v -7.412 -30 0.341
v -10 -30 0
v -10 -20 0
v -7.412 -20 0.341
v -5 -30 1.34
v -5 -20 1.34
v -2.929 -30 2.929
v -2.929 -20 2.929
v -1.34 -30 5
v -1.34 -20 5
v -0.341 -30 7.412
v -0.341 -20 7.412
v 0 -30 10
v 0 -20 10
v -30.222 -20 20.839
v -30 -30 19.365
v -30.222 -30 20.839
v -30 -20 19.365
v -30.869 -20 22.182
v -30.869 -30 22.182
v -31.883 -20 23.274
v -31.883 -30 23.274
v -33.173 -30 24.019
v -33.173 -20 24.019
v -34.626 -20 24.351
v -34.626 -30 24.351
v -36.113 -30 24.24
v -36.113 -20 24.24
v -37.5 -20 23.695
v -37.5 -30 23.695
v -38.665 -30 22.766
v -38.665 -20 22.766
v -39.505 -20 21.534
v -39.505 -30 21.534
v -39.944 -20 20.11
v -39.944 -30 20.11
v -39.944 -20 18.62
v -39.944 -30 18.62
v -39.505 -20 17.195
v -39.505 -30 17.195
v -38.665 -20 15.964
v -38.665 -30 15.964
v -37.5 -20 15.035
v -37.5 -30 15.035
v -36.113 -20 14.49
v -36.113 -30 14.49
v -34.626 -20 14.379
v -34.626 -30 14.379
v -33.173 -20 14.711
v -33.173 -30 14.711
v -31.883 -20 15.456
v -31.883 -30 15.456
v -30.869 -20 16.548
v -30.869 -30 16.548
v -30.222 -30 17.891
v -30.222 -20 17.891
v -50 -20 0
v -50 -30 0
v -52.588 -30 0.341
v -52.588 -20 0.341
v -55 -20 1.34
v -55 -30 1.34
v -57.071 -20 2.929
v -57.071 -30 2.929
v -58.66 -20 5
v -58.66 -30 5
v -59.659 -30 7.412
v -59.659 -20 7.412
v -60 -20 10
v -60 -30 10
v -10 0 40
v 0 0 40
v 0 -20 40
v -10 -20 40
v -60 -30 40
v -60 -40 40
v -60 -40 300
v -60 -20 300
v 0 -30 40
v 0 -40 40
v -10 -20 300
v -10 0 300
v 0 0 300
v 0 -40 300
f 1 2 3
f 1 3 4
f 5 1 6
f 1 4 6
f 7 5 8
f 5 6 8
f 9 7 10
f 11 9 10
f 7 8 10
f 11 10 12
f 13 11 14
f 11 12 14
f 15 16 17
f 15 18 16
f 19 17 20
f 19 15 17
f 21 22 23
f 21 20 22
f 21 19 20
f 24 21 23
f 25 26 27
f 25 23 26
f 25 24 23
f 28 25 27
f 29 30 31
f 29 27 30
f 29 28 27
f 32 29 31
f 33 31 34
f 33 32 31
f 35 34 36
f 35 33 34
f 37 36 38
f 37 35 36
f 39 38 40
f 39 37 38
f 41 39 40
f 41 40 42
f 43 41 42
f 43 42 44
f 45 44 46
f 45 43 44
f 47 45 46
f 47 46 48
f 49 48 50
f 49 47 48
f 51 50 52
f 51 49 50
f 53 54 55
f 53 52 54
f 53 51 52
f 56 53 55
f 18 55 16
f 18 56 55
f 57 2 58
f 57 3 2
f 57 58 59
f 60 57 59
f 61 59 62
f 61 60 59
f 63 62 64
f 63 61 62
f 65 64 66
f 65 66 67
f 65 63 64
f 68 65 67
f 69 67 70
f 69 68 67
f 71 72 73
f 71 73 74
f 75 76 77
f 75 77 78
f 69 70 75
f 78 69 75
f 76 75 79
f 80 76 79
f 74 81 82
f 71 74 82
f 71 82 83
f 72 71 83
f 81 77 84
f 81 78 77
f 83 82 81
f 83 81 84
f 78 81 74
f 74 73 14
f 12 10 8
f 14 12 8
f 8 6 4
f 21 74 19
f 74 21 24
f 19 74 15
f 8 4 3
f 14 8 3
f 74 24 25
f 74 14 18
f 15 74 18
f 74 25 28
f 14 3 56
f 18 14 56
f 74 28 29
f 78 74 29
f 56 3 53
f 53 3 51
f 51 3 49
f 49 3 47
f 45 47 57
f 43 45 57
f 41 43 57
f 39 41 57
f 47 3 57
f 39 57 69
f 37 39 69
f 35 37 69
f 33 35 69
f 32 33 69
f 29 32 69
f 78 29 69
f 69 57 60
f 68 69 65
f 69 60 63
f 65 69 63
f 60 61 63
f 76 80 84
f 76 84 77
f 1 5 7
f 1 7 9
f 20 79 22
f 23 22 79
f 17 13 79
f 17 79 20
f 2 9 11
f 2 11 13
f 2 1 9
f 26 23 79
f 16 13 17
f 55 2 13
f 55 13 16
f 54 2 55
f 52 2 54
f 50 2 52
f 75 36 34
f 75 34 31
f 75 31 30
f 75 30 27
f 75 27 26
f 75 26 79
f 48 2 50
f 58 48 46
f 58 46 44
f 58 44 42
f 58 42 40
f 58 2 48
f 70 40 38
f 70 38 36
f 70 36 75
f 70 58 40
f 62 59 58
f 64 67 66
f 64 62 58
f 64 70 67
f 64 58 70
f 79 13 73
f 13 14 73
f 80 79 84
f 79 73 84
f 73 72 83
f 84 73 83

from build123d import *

# Parameters (mm, degrees)
EXTRUDE_1_DEPTH     = 300
SKETCH_2_W          = 10
SKETCH_2_H          = 20
CUT_EXTRUDE_1_DEPTH = 40
SKETCH_4_R          = 5
CUT_EXTRUDE_2_DEPTH = 307.594194335
CUT_EXTRUDE_3_DEPTH = 309.544972411
FILLET_1_R          = 10


with BuildPart() as part:
    # 草图1 → 凸台-拉伸1 (new body)
    with BuildSketch(Plane.XY):
        Polygon((0, 0), (0, -40), (60, -40), (60, -20), (10, -20), (10, 0), align=None)
    extrude_1 = extrude(amount=EXTRUDE_1_DEPTH)

    # 草图2 → 切除-拉伸1 (cut)
    with BuildSketch(Plane(origin=(0, 0, 0), x_dir=(-1, 0, 0), z_dir=(0, 0, -1))):
        with Locations((-5, -10)):
            Rectangle(SKETCH_2_W, SKETCH_2_H)
        Polygon((-10, -30), (0, -30), (0, -40), (-10, -40), (-60, -40), (-60, -30), align=None)
    cut_extrude_1 = extrude(amount=-CUT_EXTRUDE_1_DEPTH, mode=Mode.SUBTRACT)

    # 草图4 → 切除-拉伸2 (cut, symmetric)
    with BuildSketch(Plane(origin=(0, -20, 0), x_dir=(1, 0, 0), z_dir=(0, 1, 0))):
        with Locations(Location((35, -19.364916731, 0), (0, 0, 180))):
            Circle(SKETCH_4_R)
    cut_extrude_2 = extrude(amount=CUT_EXTRUDE_2_DEPTH, both=True, mode=Mode.SUBTRACT)

    # 镜向1: 凸台-拉伸1, 切除-拉伸1, 切除-拉伸2 across plane
    add(extrude_1.mirror(Plane(origin=(0, 0, 300), x_dir=(0, 0, 1), z_dir=(1, 0, 0))))
    add(cut_extrude_1.mirror(Plane(origin=(0, 0, 300), x_dir=(0, 0, 1), z_dir=(1, 0, 0))), mode=Mode.SUBTRACT)
    add(cut_extrude_2.mirror(Plane(origin=(0, 0, 300), x_dir=(0, 0, 1), z_dir=(1, 0, 0))), mode=Mode.SUBTRACT)

    # 草图6 → 切除-拉伸3 (cut, through all)
    with BuildSketch(Plane(origin=(0, 0, 0), x_dir=(1, 0, 0), z_dir=(0, 1, 0))):
        Polygon((0, -314.936962627), (157.439827962, -317.852514996), (163.764973114, 23.705323245), (0, 26.738007932), align=None)
    extrude(amount=-CUT_EXTRUDE_3_DEPTH, mode=Mode.SUBTRACT)

    # 圆角1
    fillet_1_edges = [part.edges().sort_by_distance(p)[0] for p in [
        (0, -25, 0),
        (-60, -25, 0),
    ]]
    fillet(fillet_1_edges, radius=FILLET_1_R)


solid = part.part
